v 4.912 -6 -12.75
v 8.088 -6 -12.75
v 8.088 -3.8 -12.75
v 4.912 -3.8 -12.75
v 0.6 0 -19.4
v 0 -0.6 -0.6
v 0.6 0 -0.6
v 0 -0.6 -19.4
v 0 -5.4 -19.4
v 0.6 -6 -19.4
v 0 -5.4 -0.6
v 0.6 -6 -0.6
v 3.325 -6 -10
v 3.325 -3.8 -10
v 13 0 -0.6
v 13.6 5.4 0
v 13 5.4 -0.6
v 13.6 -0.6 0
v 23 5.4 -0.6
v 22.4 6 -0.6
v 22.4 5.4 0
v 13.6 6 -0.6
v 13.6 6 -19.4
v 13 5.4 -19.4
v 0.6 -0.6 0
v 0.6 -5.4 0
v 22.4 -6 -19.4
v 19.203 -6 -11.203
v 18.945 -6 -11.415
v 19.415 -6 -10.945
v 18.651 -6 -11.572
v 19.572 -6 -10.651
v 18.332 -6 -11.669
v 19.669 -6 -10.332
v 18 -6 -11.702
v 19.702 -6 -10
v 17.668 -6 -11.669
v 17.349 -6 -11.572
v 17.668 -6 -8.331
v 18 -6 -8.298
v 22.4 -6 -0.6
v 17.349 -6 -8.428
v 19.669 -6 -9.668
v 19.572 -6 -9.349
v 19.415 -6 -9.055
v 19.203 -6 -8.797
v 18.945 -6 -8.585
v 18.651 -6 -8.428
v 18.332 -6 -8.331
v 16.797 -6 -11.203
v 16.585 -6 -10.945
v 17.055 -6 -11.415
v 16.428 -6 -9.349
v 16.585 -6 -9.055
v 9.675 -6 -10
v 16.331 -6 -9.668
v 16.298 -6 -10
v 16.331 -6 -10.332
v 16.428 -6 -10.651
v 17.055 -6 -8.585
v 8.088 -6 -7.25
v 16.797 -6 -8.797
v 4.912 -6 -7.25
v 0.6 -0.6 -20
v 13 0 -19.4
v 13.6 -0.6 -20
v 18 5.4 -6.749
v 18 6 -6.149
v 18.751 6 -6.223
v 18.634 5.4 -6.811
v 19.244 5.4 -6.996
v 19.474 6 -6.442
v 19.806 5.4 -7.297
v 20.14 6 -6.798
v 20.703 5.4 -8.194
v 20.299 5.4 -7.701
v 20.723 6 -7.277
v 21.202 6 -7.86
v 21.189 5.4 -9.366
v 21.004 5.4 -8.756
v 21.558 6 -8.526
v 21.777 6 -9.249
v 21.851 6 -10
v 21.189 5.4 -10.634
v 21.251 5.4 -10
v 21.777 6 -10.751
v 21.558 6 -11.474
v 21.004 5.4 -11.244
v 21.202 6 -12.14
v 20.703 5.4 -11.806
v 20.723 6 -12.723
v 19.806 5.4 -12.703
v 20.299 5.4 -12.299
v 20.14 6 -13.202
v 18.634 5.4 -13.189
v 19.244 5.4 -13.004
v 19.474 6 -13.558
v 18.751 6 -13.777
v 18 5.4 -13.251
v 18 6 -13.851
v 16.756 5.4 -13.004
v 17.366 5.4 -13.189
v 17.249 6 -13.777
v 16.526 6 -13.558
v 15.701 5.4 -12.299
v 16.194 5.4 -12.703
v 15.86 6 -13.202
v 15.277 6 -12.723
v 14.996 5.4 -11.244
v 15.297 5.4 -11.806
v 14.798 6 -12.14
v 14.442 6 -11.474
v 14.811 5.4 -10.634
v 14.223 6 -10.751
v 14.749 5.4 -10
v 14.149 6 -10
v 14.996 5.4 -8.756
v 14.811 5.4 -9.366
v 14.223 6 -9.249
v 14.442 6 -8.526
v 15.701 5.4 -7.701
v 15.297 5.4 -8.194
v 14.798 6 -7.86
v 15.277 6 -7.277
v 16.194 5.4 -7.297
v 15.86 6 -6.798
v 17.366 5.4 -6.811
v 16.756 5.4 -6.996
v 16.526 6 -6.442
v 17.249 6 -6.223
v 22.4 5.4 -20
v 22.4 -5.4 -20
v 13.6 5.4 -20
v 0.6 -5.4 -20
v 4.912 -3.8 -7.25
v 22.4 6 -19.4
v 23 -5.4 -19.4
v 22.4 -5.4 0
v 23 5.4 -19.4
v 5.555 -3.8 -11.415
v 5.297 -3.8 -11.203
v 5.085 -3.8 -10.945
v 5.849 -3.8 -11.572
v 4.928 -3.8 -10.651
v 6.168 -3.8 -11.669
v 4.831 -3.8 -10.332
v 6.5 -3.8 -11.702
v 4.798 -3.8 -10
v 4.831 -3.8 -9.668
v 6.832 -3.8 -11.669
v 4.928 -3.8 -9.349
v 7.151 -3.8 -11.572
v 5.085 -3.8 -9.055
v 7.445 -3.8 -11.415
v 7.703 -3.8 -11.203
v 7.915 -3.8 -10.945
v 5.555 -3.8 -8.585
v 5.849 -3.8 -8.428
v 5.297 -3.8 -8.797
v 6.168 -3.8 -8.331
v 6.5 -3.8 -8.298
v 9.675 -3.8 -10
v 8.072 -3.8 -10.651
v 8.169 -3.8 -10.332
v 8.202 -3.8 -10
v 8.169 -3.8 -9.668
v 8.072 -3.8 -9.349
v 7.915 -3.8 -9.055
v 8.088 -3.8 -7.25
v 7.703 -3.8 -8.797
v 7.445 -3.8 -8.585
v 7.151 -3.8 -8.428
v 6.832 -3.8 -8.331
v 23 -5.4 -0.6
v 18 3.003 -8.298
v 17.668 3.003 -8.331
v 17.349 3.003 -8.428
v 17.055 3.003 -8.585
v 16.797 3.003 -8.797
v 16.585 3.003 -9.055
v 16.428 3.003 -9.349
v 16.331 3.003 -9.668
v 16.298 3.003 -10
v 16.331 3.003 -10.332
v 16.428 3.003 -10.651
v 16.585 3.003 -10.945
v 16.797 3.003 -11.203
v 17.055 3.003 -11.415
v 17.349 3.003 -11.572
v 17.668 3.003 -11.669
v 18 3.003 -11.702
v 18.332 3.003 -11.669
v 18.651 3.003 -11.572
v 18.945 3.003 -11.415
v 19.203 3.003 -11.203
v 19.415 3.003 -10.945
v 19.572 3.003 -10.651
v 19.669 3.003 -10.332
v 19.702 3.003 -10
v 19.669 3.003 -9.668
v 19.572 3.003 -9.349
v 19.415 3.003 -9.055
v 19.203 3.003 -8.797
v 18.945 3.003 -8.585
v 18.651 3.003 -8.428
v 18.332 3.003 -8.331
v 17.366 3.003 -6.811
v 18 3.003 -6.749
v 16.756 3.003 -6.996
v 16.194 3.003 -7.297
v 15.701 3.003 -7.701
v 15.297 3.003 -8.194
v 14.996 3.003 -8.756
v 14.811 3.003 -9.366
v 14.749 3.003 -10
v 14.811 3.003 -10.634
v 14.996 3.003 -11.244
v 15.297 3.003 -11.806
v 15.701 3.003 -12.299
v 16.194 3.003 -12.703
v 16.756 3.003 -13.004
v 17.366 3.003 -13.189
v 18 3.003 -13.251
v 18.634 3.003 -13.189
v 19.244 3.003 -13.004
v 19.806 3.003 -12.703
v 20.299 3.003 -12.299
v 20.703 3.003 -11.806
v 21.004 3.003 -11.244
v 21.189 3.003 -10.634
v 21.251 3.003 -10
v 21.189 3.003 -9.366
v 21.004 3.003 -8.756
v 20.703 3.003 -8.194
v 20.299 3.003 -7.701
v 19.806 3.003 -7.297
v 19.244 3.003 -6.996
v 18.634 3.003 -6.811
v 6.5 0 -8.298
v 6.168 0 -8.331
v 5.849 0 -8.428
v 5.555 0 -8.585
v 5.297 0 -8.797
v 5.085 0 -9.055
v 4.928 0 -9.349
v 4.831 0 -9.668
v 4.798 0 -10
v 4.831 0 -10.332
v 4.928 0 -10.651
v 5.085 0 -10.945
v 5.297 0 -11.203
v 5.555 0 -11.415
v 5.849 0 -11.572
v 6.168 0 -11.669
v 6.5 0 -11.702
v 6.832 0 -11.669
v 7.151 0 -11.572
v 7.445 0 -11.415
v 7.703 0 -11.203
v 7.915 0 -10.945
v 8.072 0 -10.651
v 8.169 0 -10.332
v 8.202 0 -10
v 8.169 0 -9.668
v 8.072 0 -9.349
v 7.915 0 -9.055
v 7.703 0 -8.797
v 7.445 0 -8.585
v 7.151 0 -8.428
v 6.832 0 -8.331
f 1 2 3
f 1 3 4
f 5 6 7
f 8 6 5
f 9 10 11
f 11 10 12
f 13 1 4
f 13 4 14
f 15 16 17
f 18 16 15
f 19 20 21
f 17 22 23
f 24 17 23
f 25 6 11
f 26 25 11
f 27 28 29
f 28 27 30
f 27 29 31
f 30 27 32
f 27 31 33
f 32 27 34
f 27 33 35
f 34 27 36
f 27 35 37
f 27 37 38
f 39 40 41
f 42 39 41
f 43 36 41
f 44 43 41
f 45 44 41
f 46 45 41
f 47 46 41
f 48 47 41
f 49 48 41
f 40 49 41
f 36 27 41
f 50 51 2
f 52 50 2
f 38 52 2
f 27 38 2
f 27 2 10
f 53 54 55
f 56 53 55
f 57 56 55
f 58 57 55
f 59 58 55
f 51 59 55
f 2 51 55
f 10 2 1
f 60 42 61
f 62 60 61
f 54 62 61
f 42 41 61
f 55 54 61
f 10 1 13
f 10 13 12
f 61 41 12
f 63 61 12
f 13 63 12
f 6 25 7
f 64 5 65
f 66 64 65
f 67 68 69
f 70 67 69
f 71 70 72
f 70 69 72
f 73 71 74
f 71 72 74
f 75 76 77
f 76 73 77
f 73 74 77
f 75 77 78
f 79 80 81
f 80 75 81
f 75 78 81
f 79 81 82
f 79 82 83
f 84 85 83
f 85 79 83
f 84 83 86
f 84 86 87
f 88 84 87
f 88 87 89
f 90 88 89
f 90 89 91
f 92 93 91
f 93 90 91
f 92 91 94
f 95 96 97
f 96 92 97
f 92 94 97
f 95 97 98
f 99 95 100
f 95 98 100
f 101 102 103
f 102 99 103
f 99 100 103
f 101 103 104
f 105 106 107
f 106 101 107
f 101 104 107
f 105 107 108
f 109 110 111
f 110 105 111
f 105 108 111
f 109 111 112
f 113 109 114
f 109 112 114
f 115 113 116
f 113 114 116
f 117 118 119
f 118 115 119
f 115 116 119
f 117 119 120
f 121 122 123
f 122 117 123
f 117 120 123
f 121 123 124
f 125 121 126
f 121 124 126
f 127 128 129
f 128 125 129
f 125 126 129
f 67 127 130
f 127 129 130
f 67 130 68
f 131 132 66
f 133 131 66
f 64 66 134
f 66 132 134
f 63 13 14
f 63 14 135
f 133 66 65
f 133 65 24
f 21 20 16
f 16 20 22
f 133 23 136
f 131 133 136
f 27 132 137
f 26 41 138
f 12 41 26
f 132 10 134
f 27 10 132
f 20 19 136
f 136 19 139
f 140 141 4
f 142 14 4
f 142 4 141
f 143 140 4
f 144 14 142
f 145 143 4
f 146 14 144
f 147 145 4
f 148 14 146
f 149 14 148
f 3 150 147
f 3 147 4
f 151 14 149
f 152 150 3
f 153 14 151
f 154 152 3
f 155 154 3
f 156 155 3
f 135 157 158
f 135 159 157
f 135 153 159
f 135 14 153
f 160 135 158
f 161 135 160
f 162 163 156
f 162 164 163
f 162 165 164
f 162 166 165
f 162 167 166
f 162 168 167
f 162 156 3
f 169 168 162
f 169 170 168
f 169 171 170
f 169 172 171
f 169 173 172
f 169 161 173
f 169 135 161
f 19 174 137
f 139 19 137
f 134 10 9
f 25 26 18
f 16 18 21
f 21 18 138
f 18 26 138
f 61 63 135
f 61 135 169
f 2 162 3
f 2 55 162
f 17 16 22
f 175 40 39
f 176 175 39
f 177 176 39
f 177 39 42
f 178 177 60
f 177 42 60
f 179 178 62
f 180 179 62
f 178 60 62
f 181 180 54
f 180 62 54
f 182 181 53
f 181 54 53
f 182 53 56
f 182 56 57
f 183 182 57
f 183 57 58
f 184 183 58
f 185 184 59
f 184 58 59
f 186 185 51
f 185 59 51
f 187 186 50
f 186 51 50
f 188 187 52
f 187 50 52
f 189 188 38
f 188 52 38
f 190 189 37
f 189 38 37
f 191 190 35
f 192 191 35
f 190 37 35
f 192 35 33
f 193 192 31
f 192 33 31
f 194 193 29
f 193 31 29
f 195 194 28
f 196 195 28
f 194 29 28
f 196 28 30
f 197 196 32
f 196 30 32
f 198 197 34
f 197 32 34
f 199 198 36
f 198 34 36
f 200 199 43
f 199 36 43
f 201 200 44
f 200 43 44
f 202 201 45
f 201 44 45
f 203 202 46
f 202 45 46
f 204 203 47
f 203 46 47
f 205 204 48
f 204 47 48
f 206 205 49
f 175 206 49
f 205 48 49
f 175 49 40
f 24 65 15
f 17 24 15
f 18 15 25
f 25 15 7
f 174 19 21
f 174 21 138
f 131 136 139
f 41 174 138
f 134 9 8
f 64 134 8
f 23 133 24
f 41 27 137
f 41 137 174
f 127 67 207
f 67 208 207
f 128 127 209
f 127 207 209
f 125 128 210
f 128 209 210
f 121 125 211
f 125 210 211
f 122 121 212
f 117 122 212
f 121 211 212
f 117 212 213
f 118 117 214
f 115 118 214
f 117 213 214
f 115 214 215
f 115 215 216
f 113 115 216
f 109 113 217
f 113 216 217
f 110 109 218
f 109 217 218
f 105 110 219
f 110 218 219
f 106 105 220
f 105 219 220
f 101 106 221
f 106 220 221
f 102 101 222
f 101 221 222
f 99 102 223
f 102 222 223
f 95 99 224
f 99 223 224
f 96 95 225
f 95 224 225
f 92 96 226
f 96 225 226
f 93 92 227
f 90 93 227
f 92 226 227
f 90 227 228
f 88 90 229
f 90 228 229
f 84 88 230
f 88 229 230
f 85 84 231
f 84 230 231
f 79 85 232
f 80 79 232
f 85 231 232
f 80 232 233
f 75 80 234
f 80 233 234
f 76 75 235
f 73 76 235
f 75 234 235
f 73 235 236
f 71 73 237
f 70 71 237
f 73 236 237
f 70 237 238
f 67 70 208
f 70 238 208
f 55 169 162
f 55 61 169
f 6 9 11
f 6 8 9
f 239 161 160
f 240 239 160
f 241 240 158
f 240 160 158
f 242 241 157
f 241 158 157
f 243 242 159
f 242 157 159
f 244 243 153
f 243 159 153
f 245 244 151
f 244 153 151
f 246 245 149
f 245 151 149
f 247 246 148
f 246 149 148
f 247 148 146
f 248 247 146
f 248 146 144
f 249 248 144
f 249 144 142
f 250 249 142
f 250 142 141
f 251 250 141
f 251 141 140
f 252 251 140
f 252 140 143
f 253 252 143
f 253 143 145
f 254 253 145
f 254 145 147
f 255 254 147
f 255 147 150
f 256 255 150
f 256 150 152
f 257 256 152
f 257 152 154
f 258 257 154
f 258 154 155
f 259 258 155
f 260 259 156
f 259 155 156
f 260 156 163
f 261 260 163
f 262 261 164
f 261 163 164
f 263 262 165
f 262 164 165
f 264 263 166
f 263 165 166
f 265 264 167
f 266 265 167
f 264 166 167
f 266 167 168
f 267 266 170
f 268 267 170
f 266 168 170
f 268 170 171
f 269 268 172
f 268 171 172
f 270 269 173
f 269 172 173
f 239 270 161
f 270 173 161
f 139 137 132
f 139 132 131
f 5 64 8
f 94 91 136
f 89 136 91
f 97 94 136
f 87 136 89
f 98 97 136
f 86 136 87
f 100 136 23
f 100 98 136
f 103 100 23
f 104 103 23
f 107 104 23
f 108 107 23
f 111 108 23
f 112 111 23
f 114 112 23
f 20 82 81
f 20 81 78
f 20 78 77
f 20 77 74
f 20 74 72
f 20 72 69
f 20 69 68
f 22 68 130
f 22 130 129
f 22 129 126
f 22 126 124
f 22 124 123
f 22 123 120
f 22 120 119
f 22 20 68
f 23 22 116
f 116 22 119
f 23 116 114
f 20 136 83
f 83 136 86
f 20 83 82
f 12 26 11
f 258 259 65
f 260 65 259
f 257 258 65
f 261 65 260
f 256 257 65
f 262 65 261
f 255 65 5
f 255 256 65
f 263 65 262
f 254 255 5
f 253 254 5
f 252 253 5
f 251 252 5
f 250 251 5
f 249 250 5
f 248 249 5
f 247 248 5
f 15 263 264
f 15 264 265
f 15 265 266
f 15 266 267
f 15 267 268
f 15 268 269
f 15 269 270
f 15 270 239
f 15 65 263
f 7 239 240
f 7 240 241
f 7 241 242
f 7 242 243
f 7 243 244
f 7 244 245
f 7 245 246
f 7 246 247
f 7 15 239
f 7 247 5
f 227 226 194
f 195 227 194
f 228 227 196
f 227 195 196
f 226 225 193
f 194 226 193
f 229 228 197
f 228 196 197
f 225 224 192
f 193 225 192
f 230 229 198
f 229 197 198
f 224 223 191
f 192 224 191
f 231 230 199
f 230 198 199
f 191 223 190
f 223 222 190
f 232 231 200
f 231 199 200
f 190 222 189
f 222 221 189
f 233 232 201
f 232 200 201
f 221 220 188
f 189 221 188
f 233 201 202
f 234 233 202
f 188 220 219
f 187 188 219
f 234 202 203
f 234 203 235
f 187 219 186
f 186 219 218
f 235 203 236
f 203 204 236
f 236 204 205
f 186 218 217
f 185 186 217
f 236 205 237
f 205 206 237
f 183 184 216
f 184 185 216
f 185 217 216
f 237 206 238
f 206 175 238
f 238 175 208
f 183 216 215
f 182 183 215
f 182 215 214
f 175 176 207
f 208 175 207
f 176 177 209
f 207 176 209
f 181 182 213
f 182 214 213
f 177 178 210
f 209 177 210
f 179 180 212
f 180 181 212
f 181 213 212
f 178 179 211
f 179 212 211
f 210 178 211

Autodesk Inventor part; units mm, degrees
ref_plane "YZ Plane" through (0, 0, 0) normal (1, 0, 0) x (0, 1, 0)
ref_plane "XZ Plane" through (0, 0, 0) normal (0, 1, 0) x (-1, 0, 0)
ref_plane "XY Plane" through (0, 0, 0) normal (0, 0, 1) x (1, 0, 0)
sketch "Sketch1" plane through (0, 0, 0) normal (0, 1, 0) x (-1, 0, 0)
  line L0 (0, 0) -> (-23, 0)
  line L1 (-23, 0) -> (-23, -20)
  line L2 (-23, -20) -> (0, -20)
  line L3 (0, -20) -> (0, 0)
  line L4 (-13, -20) -> (-13, 0)
  point P0 (-18, -10)
  point P1 (-23, -10)
  point P2 (-6.5, -10)
  point P3 (0, -10)
  dimension "d0" = 20
  dimension "d5" = 13
  dimension "d7" = 5
  dimension "d8" = 5
  dimension "d25" = 6.5
extrude "Extrusion1" add sketch "Sketch1" against normal blind 6
hole "Hole2" at (6.5, 0, -10) direction (0, -1, 0) diameter 3.4036 end through all clearance for "Socket Head Cap Screw" size "M3" standard "Ansi Metric M Profile"
sketch "Sketch3" plane through (0, -6, 0) normal (0, -1, 0) x (1, 0, 0)
  circle A0 centre (6.5, -10) radius 1.7018 construction
  line L0 (9.6754, -10) -> (8.0877, -12.75)
  line L1 (8.0877, -12.75) -> (4.9123, -12.75)
  line L2 (4.9123, -12.75) -> (3.3246, -10)
  line L3 (3.3246, -10) -> (4.9123, -7.25)
  line L4 (4.9123, -7.25) -> (8.0877, -7.25)
  line L5 (8.0877, -7.25) -> (9.6754, -10)
  dimension "d33" = 5.5
extrude "Extrusion4" cut sketch "Sketch3" against normal blind 2.2
extrude "Extrusion2" add sketch "Sketch1" along normal blind 6 contours L4 L2 L1 L0
sketch "Sketch2" plane through (0, 6, 0) normal (0, 1, 0) x (1, 0, 0)
  point P0 (18, 10)
hole "Hole1" at (18, 6, -10) direction (0, -1, 0) diameter 3.4036 end through all counterbore diameter 6.5024 counterbore depth 2.9972 clearance for "Socket Head Cap Screw" size "M3" standard "Ansi Metric M Profile"
chamfer "Chamfer1" distance 0.6 angle 45 18 edges at (6.5, 0, -20) (13, 3, -20) (18, 6, -20) (23, 6, -10) (18, 6, 0) (13, 3, 0) (6.5, 0, 0) (0, -3, 0) (23, 0, 0) (23, 0, -20) (11.5, -6, -20) (23, -6, -10) (11.5, -6, 0) (0, -6, -10) (0, -3, -20) (18, 6, -13.2512) (0, 0, -10) (13, 6, -10)
equation "\"d8\" = d7"
equation "\"d25\" = 0.5 * d5"
